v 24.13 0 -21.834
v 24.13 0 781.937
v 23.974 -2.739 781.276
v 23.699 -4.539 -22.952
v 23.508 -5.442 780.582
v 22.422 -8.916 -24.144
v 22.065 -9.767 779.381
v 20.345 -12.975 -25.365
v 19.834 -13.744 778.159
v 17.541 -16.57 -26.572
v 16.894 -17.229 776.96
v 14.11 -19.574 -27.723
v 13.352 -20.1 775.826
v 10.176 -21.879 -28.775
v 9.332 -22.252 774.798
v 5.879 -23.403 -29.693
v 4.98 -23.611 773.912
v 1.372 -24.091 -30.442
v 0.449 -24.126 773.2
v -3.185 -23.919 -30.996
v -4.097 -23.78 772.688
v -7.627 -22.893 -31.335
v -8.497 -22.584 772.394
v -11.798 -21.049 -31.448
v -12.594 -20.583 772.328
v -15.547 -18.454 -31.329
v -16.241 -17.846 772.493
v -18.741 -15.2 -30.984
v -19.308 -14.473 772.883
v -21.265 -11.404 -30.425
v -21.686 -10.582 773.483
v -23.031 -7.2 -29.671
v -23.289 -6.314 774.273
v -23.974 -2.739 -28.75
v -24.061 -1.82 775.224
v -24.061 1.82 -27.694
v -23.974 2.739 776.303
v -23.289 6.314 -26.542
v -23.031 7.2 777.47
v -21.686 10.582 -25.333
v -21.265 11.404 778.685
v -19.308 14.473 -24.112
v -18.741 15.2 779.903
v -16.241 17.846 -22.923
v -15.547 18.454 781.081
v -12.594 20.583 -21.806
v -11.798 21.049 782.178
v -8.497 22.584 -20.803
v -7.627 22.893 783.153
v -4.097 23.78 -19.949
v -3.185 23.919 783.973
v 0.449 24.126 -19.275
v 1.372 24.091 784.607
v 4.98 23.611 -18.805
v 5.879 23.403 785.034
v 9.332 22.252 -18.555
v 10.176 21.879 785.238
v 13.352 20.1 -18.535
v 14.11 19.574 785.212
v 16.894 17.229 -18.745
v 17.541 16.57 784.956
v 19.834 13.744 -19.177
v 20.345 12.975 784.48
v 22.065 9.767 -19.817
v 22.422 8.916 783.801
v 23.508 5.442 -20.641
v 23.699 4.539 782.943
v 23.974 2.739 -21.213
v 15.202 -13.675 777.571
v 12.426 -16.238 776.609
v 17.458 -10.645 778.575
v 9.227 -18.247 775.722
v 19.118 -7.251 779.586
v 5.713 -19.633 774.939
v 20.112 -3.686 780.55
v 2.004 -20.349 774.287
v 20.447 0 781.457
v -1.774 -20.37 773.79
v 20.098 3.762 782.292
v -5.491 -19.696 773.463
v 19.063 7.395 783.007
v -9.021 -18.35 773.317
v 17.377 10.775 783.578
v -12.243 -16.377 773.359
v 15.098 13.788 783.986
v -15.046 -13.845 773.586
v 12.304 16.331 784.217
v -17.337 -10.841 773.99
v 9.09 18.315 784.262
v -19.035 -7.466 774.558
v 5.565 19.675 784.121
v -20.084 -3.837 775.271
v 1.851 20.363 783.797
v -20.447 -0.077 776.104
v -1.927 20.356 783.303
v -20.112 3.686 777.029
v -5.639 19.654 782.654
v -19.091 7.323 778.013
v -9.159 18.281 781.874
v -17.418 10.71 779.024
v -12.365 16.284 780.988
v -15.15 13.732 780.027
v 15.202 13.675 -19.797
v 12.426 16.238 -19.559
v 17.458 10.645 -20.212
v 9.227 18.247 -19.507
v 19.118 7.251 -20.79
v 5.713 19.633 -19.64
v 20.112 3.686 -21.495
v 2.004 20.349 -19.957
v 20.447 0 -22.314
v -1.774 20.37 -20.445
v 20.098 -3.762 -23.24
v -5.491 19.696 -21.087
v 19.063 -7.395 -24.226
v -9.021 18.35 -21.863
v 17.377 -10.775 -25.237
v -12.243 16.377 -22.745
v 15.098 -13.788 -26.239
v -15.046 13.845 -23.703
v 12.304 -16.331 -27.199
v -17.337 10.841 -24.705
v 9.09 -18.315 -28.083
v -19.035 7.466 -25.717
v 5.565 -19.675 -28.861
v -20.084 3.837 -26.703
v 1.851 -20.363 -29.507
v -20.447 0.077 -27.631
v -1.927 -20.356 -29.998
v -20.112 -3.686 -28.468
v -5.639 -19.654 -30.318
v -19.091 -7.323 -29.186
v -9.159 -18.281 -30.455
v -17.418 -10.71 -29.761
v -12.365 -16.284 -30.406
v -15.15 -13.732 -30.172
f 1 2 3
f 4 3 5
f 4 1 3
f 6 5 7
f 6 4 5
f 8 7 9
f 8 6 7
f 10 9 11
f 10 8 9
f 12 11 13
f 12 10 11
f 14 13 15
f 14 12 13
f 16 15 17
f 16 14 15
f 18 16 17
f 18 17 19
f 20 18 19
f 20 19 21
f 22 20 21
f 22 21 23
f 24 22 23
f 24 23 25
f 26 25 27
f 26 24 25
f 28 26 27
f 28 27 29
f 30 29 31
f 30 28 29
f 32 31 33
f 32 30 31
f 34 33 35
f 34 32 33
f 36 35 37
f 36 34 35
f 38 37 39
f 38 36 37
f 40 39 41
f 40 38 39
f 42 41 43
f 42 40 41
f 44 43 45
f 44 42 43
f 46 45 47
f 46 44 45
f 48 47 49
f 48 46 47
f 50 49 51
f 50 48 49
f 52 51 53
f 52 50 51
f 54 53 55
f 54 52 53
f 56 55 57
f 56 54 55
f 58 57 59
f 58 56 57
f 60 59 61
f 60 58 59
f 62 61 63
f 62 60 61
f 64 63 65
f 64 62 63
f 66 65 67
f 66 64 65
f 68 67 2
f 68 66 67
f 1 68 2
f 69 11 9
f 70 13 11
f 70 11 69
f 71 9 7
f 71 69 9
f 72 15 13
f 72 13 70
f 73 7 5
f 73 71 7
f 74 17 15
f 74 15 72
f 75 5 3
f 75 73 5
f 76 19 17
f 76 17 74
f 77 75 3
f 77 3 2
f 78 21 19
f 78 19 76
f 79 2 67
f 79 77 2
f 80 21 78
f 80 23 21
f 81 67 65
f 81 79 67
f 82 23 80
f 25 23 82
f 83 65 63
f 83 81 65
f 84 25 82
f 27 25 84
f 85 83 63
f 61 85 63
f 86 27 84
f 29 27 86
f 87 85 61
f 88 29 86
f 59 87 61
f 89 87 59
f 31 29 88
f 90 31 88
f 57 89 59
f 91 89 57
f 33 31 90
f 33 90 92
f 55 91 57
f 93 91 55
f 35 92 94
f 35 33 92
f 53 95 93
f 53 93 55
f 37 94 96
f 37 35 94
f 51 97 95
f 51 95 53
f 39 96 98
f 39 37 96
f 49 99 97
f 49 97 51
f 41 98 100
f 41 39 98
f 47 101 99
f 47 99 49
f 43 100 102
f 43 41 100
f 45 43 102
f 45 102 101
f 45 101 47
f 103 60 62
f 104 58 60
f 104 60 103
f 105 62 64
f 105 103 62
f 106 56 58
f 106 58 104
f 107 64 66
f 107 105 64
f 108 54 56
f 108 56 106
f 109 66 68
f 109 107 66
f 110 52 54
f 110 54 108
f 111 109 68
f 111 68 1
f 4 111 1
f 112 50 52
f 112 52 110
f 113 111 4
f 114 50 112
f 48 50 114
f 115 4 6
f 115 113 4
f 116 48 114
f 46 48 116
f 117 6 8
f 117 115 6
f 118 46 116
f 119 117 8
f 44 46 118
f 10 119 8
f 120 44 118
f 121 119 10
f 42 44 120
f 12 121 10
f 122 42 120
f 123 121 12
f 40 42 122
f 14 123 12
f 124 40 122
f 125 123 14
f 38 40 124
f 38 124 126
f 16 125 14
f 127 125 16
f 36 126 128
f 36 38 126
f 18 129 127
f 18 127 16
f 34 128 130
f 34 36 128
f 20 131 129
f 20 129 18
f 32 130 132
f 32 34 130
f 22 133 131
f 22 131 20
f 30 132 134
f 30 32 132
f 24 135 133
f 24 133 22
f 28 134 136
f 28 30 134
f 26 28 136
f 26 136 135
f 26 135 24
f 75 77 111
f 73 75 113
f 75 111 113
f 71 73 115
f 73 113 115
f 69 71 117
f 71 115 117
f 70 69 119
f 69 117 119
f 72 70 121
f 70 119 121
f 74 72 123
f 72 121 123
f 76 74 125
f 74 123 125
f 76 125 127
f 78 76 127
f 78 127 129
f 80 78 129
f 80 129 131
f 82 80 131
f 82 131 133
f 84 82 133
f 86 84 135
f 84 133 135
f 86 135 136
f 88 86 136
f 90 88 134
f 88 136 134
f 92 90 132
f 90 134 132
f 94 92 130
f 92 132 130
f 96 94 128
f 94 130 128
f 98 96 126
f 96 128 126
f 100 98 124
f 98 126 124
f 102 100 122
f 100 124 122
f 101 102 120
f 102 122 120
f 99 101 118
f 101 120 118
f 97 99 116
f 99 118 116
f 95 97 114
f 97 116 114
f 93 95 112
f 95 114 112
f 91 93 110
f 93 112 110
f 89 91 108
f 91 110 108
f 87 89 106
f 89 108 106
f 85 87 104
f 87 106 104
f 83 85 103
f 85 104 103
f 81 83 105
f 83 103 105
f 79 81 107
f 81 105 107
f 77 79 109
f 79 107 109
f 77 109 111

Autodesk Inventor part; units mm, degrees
ref_plane "Start Plane" through (0, 0, -33.777) normal (0, 0, 1) x (1, 0, 0)
ref_plane "End Plane" through (0, 0, 787.5852) normal (0, 0, 1) x (1, 0, 0)
sketch "Sketch" plane through (0, 0, 0) normal (0, 0, 1) x (1, 0, 0)
  circle A0 centre (0, 0) radius 20.447
  circle A1 centre (0, 0) radius 24.13
  dimension "d0" = 48.26
  dimension "d1" = 3.683
extrude "Body" add sketch "Sketch" along normal up to surface (821.3622 mm away) from surface at -33.777
sketch "Sketch3" plane through (0, 0, 0) normal (0, 0, 1) x (1, 0, 0)
  line L0 (0, 0) -> (10, 0)
ref_plane "Work Plane3" through (0, 0, 0) normal (0, -1, 0) x (1, 0, 0)
ref_plane "Work Plane4" through (3.0414, 5.4547, -23.3078) normal (0.126, 0.2261, -0.9659) x (0.5338, -0.8362, -0.126)
split "Split1" plane through (3.0414, 5.4547, -23.3078) removes the side toward (0.126, 0.2261, -0.9659)
ref_plane "Work Plane5" through (3.1674, 5.6807, 780.5322) normal (-0.126, -0.2261, 0.9659) x (0.9919, -0.0145, 0.126)
split "Split2" plane through (3.1674, 5.6807, 780.5322) removes the side toward (-0.126, -0.2261, 0.9659)
sketch "Sketch4" plane through (0, 0, 0) normal (0, -1, 0) x (1, 0, 0)
  line L0 (-2, -33.777) -> (12, -33.777) projected
  line L1 (-2, 787.5852) -> (12, 787.5852) projected
  dimension "d7" = 821.3622
equation "\"d0\" = G_H"
equation "\"d1\" = G_T"
equation "\"d2\" = G_L"
equation "\"G_H\" = 48.26"
equation "\"G_T\" = 3.683"
equation "\"G_L\" = d7"
equation "\"G_OFFSET_START\" = 33.77702"
equation "\"G_OFFSET_END\" = -17.22068"
equation "\"d4\" = -G_OFFSET_START"
equation "\"d5\" = G_OFFSET_END + B_L"
equation "\"B_L\" = 804.8059"
properties part number "ANSI - 1 1/2 x 0.145 - 32.337" material "Steel, Mild"
